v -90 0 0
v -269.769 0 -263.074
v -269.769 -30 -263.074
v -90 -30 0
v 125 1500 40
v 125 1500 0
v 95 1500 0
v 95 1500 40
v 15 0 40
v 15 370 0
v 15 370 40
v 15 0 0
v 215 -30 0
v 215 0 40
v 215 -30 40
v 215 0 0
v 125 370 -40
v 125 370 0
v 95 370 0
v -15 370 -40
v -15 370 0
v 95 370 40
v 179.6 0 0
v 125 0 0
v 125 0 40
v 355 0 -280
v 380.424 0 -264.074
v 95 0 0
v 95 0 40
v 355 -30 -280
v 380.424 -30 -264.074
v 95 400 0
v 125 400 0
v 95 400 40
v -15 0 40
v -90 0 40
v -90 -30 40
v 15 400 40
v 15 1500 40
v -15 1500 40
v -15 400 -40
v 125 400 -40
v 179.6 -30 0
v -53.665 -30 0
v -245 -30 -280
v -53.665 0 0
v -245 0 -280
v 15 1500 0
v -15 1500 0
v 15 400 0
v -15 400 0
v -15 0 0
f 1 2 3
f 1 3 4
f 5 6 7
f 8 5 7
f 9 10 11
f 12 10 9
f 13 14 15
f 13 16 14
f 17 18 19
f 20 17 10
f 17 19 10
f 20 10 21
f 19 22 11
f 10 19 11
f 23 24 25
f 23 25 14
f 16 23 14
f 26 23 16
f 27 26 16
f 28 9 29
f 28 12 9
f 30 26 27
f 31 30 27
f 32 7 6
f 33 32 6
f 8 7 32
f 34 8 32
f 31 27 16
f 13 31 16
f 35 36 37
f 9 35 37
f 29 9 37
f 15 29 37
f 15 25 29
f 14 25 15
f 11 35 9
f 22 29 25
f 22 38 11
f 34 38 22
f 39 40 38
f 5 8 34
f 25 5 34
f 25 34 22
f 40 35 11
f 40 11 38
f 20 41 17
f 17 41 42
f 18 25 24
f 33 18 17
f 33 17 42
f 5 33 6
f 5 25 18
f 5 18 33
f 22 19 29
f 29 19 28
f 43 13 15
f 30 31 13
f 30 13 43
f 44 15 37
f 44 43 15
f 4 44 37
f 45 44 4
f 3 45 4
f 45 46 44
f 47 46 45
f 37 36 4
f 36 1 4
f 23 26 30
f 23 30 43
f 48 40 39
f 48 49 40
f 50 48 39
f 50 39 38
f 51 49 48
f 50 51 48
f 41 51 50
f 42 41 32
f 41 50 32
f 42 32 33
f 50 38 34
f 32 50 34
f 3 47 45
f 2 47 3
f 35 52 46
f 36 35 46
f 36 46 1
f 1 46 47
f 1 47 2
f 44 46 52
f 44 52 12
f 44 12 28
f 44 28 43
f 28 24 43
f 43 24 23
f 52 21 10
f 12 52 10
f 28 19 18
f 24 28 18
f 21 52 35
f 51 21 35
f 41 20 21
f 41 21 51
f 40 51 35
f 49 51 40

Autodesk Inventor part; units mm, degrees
ref_plane "YZ Plane" through (0, 0, 0) normal (1, 0, 0) x (0, 1, 0)
ref_plane "XZ Plane" through (0, 0, 0) normal (0, 1, 0) x (-1, 0, 0)
ref_plane "XY Plane" through (0, 0, 0) normal (0, 0, 1) x (1, 0, 0)
sketch "Эскиз1" plane through (0, 0, 0) normal (0, 0, 1) x (1, 0, 0)
  line L0 (0, 0) -> (110, 0)
  line L1 (0, 0) -> (15, 0)
  line L2 (15, 0) -> (-15, 0)
  line L3 (-15, 0) -> (-15, 1500)
  line L4 (-15, 1500) -> (15, 1500)
  line L5 (15, 1500) -> (15, 0)
  line L6 (110, 0) -> (95, 0)
  line L7 (95, 0) -> (125, 0)
  line L8 (125, 0) -> (125, 1500)
  line L9 (125, 1500) -> (95, 1500)
  line L10 (95, 1500) -> (95, 0)
  line L11 (0, 0) -> (-90, 0)
  line L12 (-90, 0) -> (-90, -30)
  line L13 (125, 0) -> (215, 0)
  line L14 (215, 0) -> (215, -30)
  line L15 (215, -30) -> (-90, -30)
  point P0 (-15, 0)
  dimension "d0" = 110
  dimension "d1" = 15
  dimension "d2" = 30
  dimension "d3" = 1500
  dimension "d4" = 15
  dimension "d5" = 30
  dimension "d6" = 1500
  dimension "d7" = 90
  dimension "d8" = 30
  dimension "d9" = 90
extrude "Выдавливание1" add sketch "Эскиз1" along normal blind 40
sketch "Эскиз2" plane through (-90, 0, 0) normal (0, 1, 0) x (1, 0, 0)
  line L0 (185, -40) -> (105, -40) projected
  line L1 (-191.3354, 280) -> (0, 0)
  line L2 (305, 0) -> (305, -40) projected
  line L3 (480.4002, 280) -> (305, 0)
  line L4 (445, 280) -> (269.5998, 0)
  line L5 (0, 0) -> (305, 0) projected
  line L6 (36.3354, 0) -> (-155, 280)
  line L7 (-191.3354, 280) -> (-155, 280)
  line L8 (445, 280) -> (480.4002, 280)
  line L9 (-155, 280) -> (445, 280)
  line L10 (0, 0) -> (0, -40) projected
  line L11 (0, 0) -> (36.3354, 0)
  line L12 (305, 0) -> (269.5998, 0)
  line L13 (305, 0) -> (215, 0) projected
  line L14 (185, 0) -> (105, 0) projected
  line L15 (145, 0) -> (145, 280)
  line L16 (270.8246, -0.1173) -> (29.7017, -0.1173)
  line L17 (-155, 280) -> (-179.7693, 263.0742)
  line L18 (445, 280) -> (470.4236, 264.0739)
  point P0 (90, 0)
  point P1 (269.5998, 0)
  dimension "d26" = 600
  dimension "d28" = 30
  dimension "d29" = 30
extrude "Выдавливание2" add sketch "Эскиз2" against normal blind 30 contours L17 L6 L5 L1 | L18 L3 L5 L4
sketch "Эскиз3" plane through (0, 0, 40) normal (0, 0, 1) x (1, 0, 0)
  line L0 (-15, 0) -> (-15, 400)
  line L1 (-15, 1500) -> (-15, 0) projected
  line L2 (-15, 400) -> (125, 400)
  line L3 (125, 0) -> (125, 1500) projected
  line L4 (125, 400) -> (125, 370)
  line L5 (125, 370) -> (-15, 370)
  point P0 (0, 0)
  point P1 (-15, 370)
  dimension "d22" = 400
  dimension "d23" = 30
extrude "Выдавливание3" add sketch "Эскиз3" against normal blind 80
properties part number "Стойка"
